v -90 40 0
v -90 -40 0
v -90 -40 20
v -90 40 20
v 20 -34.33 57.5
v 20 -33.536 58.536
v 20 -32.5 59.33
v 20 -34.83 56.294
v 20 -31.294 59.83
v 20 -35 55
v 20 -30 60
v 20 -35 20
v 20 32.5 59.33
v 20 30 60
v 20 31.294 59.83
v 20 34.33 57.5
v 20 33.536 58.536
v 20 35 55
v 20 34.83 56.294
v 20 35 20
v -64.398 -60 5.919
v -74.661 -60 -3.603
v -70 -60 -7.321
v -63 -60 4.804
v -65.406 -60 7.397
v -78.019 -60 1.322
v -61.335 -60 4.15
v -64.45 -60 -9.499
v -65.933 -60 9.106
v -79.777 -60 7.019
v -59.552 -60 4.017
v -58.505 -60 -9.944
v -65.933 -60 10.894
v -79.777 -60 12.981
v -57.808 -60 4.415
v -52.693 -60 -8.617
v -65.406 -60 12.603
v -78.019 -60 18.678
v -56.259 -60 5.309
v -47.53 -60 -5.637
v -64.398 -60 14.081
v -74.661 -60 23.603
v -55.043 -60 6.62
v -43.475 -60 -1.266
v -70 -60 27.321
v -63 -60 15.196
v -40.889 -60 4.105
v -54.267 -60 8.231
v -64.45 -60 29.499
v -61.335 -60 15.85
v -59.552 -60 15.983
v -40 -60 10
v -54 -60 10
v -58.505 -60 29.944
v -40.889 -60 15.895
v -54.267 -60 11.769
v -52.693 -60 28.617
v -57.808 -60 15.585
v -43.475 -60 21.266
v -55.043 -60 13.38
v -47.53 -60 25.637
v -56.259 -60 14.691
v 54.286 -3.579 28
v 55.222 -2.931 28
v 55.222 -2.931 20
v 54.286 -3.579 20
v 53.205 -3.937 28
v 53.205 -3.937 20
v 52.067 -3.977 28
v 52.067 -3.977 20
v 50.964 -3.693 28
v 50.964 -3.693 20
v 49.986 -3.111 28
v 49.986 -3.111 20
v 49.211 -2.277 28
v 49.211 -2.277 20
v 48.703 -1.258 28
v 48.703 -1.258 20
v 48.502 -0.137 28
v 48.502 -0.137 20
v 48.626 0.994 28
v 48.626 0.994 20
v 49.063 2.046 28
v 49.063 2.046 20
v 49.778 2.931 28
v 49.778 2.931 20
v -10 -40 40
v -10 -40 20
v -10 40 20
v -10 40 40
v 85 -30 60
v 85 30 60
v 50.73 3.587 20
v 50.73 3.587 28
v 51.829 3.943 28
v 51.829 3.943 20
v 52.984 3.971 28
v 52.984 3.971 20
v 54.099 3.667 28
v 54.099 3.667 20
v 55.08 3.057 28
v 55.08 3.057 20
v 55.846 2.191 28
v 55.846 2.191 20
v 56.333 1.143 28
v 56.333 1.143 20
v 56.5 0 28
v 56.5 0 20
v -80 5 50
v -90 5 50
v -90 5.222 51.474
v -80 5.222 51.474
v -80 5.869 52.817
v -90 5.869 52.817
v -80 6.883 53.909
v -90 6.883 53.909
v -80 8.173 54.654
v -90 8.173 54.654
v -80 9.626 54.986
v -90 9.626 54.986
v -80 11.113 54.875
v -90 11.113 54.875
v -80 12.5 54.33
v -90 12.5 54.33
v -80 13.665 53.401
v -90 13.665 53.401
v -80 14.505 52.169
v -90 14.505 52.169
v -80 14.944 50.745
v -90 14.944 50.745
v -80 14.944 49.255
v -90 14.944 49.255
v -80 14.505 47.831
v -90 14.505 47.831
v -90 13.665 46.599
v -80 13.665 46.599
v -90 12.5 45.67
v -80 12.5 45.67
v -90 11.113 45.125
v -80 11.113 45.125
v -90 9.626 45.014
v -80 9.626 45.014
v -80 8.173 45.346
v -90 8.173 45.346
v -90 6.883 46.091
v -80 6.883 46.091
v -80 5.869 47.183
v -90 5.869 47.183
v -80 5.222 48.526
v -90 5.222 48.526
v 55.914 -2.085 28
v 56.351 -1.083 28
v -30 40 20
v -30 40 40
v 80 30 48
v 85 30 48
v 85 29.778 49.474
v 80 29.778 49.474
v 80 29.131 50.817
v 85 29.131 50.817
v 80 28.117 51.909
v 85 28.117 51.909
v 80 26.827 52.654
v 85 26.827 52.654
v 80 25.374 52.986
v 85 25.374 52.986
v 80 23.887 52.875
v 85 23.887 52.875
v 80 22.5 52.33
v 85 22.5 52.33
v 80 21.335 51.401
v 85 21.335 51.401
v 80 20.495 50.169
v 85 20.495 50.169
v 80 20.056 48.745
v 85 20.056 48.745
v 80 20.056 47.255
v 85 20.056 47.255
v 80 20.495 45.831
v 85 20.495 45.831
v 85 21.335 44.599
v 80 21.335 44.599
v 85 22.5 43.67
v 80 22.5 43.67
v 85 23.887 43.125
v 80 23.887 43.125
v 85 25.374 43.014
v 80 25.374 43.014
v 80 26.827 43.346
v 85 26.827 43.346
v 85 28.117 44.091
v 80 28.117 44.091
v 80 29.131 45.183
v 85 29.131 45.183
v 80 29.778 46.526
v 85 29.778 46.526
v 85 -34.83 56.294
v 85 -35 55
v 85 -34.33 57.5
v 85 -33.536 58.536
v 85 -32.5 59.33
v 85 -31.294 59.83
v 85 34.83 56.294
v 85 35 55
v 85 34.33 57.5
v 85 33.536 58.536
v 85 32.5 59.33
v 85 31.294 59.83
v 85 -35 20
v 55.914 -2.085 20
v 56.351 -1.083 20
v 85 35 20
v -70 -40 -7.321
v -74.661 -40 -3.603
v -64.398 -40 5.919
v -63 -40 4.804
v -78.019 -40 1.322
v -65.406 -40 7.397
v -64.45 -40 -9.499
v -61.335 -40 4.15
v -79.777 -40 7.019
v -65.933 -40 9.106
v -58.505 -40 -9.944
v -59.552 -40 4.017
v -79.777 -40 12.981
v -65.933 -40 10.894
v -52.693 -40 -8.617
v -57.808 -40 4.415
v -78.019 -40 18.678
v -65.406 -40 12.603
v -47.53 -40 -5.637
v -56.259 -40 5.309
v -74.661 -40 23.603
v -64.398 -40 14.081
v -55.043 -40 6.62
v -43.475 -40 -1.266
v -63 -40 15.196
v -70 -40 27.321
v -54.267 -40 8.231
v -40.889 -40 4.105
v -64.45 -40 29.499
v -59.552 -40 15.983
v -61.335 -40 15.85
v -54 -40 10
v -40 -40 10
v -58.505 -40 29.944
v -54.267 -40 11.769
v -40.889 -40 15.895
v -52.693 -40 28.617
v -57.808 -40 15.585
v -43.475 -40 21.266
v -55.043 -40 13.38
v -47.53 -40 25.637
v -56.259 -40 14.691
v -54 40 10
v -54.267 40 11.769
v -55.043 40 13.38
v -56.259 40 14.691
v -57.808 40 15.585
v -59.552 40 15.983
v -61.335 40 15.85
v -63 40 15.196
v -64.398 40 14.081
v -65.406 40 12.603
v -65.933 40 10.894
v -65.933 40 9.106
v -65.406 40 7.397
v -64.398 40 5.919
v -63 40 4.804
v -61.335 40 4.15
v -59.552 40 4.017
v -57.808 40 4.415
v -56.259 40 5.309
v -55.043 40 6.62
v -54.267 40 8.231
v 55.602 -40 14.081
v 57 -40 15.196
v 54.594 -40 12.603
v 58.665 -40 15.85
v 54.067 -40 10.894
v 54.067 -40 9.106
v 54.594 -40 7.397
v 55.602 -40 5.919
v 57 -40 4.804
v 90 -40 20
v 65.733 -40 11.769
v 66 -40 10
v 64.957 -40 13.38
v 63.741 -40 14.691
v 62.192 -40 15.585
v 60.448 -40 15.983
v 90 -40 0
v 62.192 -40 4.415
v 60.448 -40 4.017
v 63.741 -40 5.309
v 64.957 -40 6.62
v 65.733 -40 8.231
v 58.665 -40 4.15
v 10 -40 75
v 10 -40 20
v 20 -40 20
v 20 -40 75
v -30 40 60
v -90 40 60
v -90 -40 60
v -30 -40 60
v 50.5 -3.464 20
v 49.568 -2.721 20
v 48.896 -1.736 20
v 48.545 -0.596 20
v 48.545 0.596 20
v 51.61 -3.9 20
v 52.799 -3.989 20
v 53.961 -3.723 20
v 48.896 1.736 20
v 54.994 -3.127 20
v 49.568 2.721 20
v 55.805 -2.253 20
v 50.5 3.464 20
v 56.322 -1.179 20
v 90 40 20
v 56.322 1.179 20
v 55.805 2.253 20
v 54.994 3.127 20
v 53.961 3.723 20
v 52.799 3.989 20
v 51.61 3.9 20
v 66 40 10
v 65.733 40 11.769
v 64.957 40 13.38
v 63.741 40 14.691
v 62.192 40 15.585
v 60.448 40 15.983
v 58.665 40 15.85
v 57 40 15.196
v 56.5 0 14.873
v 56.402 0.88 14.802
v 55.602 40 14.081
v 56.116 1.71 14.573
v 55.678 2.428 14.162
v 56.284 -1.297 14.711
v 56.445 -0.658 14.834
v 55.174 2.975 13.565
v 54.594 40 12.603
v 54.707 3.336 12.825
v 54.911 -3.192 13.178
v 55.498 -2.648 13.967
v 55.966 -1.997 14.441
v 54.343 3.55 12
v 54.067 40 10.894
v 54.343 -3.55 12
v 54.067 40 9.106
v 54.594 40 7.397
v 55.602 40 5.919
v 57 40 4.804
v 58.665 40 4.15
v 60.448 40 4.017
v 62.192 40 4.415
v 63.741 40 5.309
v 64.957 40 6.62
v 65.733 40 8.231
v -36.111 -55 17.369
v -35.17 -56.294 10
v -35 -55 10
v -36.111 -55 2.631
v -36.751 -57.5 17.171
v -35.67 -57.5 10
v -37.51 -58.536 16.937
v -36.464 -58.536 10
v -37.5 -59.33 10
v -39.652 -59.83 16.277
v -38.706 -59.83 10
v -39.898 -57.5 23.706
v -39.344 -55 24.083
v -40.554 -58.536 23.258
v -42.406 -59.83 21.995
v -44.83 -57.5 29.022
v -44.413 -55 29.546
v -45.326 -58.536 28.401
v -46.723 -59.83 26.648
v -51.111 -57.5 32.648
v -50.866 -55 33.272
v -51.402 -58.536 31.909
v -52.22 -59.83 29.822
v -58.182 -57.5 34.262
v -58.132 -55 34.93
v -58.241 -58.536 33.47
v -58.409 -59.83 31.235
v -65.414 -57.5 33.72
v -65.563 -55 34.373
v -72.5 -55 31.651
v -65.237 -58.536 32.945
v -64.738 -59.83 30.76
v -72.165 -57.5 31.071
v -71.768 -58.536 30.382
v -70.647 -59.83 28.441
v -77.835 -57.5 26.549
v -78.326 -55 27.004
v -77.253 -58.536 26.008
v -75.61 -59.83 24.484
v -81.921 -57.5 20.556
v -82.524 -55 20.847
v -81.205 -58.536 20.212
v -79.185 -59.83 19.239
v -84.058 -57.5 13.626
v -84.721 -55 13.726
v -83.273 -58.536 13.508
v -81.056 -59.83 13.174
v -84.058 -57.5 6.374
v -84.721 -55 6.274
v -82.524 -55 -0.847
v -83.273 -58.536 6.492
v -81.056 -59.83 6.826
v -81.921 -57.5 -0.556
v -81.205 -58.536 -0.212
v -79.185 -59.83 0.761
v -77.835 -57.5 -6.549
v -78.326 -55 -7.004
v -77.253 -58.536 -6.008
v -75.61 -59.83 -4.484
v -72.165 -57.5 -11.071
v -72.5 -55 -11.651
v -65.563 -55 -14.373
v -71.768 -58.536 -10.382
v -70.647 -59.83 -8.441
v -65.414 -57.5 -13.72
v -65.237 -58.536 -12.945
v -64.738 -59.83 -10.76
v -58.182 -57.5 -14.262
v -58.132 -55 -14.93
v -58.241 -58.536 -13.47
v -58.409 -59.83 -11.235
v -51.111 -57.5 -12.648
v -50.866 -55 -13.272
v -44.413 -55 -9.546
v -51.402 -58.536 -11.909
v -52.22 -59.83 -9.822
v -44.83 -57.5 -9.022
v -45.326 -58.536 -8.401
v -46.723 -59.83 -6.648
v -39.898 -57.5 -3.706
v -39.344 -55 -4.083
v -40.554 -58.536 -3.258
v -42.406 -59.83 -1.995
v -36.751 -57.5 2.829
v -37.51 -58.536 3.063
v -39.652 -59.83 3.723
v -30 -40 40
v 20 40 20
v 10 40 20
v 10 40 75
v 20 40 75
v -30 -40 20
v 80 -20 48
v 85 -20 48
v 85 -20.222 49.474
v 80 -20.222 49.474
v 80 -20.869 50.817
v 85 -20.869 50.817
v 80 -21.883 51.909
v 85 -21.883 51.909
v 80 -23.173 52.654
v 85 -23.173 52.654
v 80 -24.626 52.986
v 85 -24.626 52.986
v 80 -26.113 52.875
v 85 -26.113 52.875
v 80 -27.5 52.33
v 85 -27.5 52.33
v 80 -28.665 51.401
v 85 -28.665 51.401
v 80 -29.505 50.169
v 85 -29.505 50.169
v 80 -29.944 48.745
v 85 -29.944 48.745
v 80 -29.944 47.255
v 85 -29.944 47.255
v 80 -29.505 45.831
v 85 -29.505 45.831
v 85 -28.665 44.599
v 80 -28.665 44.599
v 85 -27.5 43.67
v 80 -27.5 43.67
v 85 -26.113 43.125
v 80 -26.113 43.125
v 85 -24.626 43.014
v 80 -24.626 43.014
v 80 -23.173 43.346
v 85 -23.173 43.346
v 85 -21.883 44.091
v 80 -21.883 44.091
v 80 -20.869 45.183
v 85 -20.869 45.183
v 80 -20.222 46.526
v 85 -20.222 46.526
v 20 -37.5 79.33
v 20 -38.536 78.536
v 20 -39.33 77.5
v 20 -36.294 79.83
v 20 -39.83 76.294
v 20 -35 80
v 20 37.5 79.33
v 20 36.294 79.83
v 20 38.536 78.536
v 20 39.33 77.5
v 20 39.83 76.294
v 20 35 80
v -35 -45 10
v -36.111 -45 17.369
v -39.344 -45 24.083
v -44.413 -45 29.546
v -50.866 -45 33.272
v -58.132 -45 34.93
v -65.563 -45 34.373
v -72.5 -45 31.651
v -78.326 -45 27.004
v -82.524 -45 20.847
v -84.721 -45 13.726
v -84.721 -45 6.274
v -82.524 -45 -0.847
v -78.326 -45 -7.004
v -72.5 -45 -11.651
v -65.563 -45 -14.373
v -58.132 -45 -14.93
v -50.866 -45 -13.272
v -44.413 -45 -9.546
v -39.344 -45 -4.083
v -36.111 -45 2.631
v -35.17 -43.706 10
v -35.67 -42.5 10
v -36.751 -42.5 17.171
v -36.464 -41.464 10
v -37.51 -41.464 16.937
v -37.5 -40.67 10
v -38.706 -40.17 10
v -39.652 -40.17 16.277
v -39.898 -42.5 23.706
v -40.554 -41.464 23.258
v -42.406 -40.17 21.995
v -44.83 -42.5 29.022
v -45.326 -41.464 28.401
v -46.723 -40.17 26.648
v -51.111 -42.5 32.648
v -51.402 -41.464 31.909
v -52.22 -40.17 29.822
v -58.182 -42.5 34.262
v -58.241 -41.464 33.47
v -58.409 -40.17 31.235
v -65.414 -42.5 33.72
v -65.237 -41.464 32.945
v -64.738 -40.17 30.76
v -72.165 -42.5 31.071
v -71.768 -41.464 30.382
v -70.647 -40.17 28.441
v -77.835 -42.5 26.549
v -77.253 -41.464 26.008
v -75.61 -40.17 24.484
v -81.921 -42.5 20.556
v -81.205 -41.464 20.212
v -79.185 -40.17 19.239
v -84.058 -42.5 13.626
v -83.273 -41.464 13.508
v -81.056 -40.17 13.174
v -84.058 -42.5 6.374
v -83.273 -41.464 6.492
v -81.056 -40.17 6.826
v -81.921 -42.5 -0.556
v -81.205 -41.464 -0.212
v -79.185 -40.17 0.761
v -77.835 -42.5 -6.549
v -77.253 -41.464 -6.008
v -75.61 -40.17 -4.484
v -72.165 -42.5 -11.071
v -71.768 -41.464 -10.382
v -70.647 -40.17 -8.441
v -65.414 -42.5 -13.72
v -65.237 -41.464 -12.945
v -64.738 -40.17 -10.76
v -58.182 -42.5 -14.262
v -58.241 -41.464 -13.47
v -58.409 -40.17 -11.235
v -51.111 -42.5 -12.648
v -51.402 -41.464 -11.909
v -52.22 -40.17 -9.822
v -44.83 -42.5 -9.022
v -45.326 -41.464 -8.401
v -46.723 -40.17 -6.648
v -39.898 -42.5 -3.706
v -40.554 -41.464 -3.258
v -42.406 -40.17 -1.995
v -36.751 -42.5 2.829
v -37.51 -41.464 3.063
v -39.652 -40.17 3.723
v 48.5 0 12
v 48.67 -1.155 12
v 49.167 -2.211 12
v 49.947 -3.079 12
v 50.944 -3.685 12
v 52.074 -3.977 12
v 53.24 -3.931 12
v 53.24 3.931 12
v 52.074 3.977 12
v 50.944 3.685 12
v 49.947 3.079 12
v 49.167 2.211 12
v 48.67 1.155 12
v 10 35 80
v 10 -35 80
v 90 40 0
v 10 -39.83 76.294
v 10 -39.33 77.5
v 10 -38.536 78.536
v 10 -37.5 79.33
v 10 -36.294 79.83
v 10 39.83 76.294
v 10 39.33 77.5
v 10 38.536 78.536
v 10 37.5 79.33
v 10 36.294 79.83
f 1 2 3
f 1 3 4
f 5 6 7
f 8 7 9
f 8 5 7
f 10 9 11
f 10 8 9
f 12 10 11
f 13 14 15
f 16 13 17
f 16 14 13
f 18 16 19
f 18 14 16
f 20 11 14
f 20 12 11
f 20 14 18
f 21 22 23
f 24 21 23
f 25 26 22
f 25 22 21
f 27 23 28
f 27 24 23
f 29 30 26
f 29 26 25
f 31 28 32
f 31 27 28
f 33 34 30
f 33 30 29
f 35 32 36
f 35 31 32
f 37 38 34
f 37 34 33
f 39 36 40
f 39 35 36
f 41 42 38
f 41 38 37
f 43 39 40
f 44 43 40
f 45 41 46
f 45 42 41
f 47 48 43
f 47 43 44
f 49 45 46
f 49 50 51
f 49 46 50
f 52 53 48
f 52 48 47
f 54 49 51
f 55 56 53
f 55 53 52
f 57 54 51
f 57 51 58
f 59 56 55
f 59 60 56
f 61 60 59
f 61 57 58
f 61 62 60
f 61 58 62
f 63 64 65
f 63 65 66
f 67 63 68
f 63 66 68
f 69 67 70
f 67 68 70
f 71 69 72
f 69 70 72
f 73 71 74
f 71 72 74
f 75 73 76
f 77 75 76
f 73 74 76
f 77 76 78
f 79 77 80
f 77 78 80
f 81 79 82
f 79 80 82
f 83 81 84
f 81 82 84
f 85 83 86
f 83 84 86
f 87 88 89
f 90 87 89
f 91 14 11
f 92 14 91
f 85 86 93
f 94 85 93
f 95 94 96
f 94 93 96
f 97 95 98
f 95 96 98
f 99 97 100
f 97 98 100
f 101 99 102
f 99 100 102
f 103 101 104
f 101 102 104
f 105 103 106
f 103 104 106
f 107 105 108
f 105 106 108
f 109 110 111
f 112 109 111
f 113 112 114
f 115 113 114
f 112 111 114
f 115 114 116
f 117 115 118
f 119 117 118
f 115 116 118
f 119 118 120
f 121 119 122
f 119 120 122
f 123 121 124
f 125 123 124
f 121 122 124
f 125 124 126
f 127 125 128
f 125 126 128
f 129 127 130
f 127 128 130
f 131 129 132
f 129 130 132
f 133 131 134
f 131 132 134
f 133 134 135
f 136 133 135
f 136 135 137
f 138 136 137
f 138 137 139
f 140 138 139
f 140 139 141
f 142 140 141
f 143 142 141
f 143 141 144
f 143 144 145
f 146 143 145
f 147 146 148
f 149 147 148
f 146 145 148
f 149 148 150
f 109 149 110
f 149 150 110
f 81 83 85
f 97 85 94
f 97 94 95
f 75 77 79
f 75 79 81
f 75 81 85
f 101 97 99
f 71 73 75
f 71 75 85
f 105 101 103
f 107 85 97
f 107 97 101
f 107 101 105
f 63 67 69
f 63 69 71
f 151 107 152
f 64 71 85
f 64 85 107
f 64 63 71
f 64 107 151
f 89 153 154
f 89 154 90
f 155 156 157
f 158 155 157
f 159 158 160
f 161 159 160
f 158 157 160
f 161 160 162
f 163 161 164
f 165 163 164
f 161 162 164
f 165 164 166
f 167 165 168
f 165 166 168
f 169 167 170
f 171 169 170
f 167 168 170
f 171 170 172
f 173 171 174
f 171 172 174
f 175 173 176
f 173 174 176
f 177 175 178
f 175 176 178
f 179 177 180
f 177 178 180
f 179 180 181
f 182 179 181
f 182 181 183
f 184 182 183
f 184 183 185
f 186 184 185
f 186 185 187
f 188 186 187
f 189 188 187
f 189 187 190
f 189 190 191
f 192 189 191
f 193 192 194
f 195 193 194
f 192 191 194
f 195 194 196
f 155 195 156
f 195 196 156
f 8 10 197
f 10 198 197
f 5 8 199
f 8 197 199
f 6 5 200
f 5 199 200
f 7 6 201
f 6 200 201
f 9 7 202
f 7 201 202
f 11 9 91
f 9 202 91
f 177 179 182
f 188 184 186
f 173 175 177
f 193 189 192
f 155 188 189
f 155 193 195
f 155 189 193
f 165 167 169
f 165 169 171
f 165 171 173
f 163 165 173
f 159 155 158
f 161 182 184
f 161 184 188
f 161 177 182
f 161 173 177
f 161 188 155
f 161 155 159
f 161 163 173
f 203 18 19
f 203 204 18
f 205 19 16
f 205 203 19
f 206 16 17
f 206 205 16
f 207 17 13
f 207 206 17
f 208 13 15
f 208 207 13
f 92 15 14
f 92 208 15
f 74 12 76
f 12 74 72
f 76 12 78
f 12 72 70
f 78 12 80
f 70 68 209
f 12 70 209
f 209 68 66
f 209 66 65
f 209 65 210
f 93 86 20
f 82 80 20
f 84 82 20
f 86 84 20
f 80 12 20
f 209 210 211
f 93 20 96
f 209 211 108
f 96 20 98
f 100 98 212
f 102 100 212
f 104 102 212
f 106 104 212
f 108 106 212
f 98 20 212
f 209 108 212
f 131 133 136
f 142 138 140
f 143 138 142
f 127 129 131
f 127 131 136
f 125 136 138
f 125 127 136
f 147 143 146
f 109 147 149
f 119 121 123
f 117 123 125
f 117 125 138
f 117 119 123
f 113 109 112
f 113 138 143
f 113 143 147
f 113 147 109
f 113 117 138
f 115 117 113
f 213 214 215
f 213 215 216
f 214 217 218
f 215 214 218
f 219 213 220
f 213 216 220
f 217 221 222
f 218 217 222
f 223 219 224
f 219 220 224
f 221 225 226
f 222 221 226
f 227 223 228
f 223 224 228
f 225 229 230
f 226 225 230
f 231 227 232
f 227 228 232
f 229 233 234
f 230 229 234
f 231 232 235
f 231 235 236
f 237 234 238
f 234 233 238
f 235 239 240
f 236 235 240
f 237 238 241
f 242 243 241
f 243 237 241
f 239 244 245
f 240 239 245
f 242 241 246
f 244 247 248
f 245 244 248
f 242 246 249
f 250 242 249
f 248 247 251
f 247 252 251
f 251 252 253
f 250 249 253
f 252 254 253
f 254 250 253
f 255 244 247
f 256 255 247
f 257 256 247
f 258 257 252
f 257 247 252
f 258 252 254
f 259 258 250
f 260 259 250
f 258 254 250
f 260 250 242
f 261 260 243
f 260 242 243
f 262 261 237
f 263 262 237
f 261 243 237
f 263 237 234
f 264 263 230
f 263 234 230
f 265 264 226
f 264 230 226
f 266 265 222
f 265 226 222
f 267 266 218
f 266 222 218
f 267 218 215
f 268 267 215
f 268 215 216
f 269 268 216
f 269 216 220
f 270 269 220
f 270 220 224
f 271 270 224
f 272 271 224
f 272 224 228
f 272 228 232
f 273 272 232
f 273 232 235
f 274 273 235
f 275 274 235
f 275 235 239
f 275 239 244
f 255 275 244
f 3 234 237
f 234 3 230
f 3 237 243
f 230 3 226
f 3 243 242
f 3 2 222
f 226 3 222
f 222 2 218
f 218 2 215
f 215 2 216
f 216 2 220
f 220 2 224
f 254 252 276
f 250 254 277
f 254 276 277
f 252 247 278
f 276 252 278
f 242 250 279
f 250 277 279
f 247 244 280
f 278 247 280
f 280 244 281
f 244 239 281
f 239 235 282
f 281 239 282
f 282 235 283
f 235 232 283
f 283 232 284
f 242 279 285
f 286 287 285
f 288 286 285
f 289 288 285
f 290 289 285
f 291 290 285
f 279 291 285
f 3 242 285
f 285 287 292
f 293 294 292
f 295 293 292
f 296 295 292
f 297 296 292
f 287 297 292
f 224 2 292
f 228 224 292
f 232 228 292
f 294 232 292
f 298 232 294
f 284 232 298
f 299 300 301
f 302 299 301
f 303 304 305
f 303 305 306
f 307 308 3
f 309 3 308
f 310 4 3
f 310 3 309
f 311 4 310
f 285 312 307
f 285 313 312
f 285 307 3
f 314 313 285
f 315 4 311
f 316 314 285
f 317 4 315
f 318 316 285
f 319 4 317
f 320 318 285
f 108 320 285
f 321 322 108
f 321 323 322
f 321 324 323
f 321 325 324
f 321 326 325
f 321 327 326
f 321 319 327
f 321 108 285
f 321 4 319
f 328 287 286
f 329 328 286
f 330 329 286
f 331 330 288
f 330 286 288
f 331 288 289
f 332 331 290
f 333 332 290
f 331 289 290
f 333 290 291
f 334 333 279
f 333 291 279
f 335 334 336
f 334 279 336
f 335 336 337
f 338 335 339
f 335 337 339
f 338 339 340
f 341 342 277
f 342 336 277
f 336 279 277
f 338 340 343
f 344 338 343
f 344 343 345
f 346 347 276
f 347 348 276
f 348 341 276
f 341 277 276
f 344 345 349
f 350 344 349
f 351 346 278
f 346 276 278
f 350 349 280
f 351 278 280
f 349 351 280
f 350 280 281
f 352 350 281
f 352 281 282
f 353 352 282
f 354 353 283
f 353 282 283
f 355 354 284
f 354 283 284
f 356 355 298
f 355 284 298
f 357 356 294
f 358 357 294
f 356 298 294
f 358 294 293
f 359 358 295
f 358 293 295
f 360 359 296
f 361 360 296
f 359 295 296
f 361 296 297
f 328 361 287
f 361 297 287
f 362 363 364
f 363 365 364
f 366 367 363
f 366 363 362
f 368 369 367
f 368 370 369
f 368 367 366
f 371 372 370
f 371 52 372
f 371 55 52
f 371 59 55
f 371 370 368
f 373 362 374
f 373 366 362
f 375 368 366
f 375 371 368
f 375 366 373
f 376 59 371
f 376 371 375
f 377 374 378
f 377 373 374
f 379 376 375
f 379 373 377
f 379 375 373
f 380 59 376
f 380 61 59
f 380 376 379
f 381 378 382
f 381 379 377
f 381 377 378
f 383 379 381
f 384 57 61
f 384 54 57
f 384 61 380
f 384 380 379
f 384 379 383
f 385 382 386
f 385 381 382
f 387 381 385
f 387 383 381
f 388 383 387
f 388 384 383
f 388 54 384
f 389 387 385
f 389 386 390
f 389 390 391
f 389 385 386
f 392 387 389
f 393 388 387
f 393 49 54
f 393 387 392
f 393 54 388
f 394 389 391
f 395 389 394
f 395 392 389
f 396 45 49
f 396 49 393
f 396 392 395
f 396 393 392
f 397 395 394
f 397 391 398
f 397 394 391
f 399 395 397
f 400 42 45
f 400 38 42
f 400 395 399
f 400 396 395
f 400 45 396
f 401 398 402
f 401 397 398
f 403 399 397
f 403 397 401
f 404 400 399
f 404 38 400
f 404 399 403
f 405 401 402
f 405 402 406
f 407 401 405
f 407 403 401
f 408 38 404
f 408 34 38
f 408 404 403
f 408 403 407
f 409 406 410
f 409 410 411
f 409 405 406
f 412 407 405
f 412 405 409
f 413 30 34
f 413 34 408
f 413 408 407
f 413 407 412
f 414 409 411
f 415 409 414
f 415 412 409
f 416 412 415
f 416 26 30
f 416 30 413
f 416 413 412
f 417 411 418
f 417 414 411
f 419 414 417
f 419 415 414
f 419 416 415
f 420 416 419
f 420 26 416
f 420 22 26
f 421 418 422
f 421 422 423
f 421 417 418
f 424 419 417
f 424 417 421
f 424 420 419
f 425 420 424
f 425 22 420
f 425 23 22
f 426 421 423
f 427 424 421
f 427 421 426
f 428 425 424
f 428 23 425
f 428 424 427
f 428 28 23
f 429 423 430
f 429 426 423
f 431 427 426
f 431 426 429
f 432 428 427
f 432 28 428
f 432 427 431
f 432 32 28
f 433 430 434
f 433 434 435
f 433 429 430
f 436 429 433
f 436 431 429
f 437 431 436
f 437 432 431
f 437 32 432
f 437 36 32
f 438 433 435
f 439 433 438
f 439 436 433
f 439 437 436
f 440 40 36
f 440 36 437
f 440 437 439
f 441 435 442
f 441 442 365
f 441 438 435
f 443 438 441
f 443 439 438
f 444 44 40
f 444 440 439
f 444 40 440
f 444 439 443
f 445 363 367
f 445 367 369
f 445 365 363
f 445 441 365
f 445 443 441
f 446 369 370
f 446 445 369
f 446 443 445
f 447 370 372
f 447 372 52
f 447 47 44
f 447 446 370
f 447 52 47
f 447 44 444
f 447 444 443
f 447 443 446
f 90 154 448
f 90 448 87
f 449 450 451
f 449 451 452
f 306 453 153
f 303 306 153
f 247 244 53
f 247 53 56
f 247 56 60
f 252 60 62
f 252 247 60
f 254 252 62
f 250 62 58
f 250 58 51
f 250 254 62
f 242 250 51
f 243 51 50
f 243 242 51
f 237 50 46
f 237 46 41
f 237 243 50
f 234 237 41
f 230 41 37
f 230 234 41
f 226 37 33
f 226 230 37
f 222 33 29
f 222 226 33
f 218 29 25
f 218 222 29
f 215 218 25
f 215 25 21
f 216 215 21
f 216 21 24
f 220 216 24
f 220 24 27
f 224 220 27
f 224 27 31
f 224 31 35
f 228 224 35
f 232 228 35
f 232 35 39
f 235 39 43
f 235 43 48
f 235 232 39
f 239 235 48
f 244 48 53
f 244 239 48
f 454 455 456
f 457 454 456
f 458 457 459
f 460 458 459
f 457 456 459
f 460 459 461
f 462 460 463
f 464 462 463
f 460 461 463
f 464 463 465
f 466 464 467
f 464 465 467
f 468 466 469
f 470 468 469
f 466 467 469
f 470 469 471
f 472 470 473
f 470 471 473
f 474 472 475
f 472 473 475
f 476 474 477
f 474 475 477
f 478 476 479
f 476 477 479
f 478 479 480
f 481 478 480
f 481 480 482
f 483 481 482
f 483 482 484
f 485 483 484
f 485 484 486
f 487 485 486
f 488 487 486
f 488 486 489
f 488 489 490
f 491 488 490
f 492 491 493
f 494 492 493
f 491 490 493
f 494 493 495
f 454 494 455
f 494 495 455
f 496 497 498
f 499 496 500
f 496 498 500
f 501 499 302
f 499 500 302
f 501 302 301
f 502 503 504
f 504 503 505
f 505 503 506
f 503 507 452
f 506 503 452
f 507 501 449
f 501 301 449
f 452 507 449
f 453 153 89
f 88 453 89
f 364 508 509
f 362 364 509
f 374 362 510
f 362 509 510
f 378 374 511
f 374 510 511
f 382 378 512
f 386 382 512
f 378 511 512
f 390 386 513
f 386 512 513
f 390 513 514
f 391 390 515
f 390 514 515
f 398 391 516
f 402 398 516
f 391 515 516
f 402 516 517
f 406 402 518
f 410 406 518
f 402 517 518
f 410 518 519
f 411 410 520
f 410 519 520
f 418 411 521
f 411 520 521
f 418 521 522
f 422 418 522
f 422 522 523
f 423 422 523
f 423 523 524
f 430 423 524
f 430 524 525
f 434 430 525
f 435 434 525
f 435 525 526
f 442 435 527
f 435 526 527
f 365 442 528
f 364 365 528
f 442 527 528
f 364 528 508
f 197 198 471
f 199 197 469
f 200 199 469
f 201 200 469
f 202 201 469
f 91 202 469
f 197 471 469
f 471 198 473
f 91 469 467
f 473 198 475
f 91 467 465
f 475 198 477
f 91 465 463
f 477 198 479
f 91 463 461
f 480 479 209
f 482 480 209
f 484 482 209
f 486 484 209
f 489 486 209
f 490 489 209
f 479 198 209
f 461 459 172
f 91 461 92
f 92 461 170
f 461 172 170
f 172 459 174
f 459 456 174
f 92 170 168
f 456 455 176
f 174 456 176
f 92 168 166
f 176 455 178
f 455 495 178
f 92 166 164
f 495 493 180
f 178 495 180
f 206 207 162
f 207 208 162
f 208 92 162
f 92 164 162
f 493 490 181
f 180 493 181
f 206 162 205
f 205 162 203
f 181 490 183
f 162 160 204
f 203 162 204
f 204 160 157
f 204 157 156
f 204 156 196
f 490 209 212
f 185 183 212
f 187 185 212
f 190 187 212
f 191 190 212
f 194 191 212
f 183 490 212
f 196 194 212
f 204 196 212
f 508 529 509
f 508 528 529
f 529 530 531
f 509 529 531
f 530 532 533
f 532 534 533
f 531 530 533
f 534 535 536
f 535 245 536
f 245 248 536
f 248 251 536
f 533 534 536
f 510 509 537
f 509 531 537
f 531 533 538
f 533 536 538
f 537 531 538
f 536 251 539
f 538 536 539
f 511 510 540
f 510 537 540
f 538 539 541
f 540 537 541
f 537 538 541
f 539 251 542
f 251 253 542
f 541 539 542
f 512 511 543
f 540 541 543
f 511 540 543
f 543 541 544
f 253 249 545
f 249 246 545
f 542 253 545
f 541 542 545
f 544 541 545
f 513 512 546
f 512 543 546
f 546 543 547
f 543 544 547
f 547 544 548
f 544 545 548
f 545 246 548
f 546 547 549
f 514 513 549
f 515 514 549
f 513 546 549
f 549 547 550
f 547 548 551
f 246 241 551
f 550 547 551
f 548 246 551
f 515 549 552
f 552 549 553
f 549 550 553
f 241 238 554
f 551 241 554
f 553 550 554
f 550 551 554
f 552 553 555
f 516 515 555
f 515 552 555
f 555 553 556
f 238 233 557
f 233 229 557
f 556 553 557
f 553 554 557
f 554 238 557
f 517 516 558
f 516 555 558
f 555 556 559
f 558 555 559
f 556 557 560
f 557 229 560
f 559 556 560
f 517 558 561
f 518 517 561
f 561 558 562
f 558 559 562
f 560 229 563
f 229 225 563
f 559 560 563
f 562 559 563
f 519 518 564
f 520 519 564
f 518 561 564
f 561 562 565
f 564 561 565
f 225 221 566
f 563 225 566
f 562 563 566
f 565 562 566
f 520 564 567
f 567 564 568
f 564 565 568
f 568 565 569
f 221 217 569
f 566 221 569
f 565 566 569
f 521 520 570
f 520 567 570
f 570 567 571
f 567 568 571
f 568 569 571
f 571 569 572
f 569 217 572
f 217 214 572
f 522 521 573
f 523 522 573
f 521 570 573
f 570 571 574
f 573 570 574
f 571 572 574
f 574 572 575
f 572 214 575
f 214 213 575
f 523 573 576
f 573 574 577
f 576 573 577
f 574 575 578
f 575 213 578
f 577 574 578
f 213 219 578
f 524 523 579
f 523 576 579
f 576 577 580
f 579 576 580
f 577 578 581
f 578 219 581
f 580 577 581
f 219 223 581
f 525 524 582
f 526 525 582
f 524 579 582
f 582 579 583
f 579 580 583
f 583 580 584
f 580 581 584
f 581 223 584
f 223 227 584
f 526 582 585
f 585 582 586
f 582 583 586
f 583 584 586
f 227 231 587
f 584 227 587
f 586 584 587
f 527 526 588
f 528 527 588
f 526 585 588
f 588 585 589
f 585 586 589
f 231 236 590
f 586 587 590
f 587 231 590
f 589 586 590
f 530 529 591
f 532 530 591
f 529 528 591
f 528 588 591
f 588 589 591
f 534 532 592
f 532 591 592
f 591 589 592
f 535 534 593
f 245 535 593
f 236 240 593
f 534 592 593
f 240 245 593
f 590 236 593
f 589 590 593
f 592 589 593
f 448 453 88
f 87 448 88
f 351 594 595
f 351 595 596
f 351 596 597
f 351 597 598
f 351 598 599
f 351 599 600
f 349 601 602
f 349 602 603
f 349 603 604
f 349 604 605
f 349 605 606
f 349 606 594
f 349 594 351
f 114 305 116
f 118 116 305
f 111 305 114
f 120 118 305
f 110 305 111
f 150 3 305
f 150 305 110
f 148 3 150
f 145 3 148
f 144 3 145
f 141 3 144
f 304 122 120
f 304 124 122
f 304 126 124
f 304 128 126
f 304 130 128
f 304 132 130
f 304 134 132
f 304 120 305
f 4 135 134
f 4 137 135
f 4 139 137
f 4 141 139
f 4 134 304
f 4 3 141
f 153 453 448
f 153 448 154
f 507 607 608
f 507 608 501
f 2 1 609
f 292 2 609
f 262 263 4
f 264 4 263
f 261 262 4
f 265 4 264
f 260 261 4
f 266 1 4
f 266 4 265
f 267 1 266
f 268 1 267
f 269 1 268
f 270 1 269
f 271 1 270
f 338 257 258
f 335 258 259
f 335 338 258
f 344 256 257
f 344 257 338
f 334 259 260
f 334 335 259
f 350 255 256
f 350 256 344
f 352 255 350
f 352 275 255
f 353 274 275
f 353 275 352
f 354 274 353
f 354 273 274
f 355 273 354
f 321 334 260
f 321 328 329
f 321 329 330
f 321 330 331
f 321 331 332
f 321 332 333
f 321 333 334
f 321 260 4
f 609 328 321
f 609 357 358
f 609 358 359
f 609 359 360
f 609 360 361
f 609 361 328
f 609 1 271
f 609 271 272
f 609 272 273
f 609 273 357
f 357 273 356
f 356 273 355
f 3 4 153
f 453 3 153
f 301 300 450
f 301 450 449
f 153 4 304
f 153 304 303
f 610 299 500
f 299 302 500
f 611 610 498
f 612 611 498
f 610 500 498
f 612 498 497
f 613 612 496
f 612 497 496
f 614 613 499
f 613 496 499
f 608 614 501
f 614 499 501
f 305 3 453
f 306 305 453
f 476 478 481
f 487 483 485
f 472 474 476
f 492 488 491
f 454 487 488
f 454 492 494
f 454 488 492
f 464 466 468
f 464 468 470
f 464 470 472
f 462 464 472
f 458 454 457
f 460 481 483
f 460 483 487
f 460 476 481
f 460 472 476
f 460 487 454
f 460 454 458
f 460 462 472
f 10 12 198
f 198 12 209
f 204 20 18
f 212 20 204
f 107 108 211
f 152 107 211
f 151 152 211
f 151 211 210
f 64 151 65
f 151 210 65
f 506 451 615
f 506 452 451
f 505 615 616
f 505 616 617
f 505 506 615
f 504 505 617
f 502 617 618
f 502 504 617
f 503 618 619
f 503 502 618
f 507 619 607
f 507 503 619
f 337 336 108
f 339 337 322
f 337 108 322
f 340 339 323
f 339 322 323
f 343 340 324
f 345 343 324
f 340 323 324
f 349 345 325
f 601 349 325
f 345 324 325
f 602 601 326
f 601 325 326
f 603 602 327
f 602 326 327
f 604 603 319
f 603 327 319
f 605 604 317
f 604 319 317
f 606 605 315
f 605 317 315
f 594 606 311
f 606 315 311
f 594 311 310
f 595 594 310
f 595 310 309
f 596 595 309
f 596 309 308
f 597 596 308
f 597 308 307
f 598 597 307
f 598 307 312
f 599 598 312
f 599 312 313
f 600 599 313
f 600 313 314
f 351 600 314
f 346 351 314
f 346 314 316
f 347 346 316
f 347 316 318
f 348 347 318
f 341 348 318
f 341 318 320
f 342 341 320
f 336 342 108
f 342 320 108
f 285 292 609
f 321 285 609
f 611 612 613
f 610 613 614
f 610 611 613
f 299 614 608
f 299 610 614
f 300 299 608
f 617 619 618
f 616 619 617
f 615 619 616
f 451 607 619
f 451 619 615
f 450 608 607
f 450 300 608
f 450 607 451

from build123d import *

# Parameters (mm, degrees)
F0_W      = 180
F0_H      = 80
F1_DEPTH  = 20
F2_R      = 6
F3_DEPTH  = 80.001
F4_W      = 60
F4_H      = 80
F5_DEPTH  = 40
F6_W      = 20
F6_H      = 80
F7_DEPTH  = 20
F8_W      = 65
F8_H      = 70
F9_DEPTH  = 40
F10_R     = 5
F11_DEPTH = 5
F12_W     = 10
F12_H     = 80
F13_DEPTH = 60
F14_R     = 25
F14_R_2   = 6
F15_DEPTH = 20
F16_R     = 5
F17_R     = 5
F18_DEPTH = 10
F19_R     = 5
F20_R     = 5
F22_DEPTH = 8
F23_R     = 4
F24_DEPTH = 8


with BuildPart() as f1:
    # F0 (on Top) → F1 (new body)
    with BuildSketch(Plane.XY):
        Rectangle(F0_W, F0_H)
    extrude(amount=F1_DEPTH)

    # F2 (on face) → F3 (cut, through all)
    with BuildSketch(Plane.XZ.offset(40)):
        with Locations((-60, 10)):
            Circle(F2_R)
        with Locations((60, 10)):
            Circle(F2_R)
    extrude(amount=-F3_DEPTH, mode=Mode.SUBTRACT)

    # F23 (on face) → F24 (cut)
    with BuildSketch(Plane.XY.offset(20)):
        with Locations((52.5, 0)):
            Circle(F23_R)
    extrude(amount=-F24_DEPTH, mode=Mode.SUBTRACT)


with BuildPart() as f5:
    # F4 (on face) → F5 (new body)
    with BuildSketch(Plane.XY.offset(20)):
        with Locations((-60, 0)):
            Rectangle(F4_W, F4_H)
    extrude(amount=F5_DEPTH)

    # F17 (on face) → F18 (cut)
    with BuildSketch(Plane(origin=(-90, 0, 0), x_dir=(0, -1, 0), z_dir=(-1, 0, 0))):
        with Locations((-10, 50)):
            Circle(F17_R)
    extrude(amount=-F18_DEPTH, mode=Mode.SUBTRACT)


with BuildPart() as f7:
    # F6 (on face) → F7 (new body)
    with BuildSketch(Plane.XY.offset(20)):
        with Locations((-20, 0)):
            Rectangle(F6_W, F6_H)
    extrude(amount=F7_DEPTH)


with BuildPart() as f9:
    # F8 (on face) → F9 (new body)
    with BuildSketch(Plane.XY.offset(20)):
        with Locations((52.5, 0)):
            Rectangle(F8_W, F8_H)
    extrude(amount=F9_DEPTH)

    # F10 (on face) → F11 (cut)
    with BuildSketch(Plane.YZ.offset(85)):
        with Locations((-25, 48)):
            Circle(F10_R)
        with Locations((25, 48)):
            Circle(F10_R)
    extrude(amount=-F11_DEPTH, mode=Mode.SUBTRACT)

    # F19
    f19_edges = [f9.edges().sort_by_distance(p)[0] for p in [
        (52.5, -35, 60),
        (52.5, 35, 60),
    ]]
    fillet(f19_edges, radius=F19_R)

    # F21 (on face) → F22 (cut)
    with BuildSketch(Plane(origin=(0, 0, 20), x_dir=(1, 0, 0), z_dir=(0, 0, -1))):
        with BuildLine():
            ThreePointArc((56.5, 0), (56.166553, 1.598872), (55.221804, 2.931174))
            Line((55.221804, 2.931174), (49.778196, -2.931174))
            ThreePointArc((49.778196, -2.931174), (54.098872, -3.666553), (56.5, 0))
        make_face()
        with BuildLine():
            Line((49.778196, -2.931174), (55.221804, 2.931174))
            ThreePointArc((55.221804, 2.931174), (49.568826, 2.721804), (49.778196, -2.931174))
        make_face()
    extrude(amount=-F22_DEPTH, mode=Mode.SUBTRACT)


with BuildPart() as f13:
    # F12 (on face) → F13 (new body)
    with BuildSketch(Plane.XY.offset(20)):
        with Locations((15, 0)):
            Rectangle(F12_W, F12_H)
    extrude(amount=F13_DEPTH)

    # F20
    f20_edges = [f13.edges().sort_by_distance(p)[0] for p in [
        (15, -40, 80),
        (15, 40, 80),
    ]]
    fillet(f20_edges, radius=F20_R)


with BuildPart() as f15:
    # F14 (on face) → F15 (new body)
    with BuildSketch(Plane.XZ.offset(40)):
        with Locations((-60, 10)):
            Circle(F14_R)
        with Locations((-60, 10)):
            Circle(F14_R_2, mode=Mode.SUBTRACT)
    extrude(amount=F15_DEPTH)

    # F16
    f16_edges = [f15.edges().sort_by_distance(p)[0] for p in [
        (-35, -50, 10),
        (-85, -40, 10),
        (-85, -60, 10),
    ]]
    fillet(f16_edges, radius=F16_R)


solid = Compound([f1.part, f5.part, f7.part, f9.part, f13.part, f15.part])
